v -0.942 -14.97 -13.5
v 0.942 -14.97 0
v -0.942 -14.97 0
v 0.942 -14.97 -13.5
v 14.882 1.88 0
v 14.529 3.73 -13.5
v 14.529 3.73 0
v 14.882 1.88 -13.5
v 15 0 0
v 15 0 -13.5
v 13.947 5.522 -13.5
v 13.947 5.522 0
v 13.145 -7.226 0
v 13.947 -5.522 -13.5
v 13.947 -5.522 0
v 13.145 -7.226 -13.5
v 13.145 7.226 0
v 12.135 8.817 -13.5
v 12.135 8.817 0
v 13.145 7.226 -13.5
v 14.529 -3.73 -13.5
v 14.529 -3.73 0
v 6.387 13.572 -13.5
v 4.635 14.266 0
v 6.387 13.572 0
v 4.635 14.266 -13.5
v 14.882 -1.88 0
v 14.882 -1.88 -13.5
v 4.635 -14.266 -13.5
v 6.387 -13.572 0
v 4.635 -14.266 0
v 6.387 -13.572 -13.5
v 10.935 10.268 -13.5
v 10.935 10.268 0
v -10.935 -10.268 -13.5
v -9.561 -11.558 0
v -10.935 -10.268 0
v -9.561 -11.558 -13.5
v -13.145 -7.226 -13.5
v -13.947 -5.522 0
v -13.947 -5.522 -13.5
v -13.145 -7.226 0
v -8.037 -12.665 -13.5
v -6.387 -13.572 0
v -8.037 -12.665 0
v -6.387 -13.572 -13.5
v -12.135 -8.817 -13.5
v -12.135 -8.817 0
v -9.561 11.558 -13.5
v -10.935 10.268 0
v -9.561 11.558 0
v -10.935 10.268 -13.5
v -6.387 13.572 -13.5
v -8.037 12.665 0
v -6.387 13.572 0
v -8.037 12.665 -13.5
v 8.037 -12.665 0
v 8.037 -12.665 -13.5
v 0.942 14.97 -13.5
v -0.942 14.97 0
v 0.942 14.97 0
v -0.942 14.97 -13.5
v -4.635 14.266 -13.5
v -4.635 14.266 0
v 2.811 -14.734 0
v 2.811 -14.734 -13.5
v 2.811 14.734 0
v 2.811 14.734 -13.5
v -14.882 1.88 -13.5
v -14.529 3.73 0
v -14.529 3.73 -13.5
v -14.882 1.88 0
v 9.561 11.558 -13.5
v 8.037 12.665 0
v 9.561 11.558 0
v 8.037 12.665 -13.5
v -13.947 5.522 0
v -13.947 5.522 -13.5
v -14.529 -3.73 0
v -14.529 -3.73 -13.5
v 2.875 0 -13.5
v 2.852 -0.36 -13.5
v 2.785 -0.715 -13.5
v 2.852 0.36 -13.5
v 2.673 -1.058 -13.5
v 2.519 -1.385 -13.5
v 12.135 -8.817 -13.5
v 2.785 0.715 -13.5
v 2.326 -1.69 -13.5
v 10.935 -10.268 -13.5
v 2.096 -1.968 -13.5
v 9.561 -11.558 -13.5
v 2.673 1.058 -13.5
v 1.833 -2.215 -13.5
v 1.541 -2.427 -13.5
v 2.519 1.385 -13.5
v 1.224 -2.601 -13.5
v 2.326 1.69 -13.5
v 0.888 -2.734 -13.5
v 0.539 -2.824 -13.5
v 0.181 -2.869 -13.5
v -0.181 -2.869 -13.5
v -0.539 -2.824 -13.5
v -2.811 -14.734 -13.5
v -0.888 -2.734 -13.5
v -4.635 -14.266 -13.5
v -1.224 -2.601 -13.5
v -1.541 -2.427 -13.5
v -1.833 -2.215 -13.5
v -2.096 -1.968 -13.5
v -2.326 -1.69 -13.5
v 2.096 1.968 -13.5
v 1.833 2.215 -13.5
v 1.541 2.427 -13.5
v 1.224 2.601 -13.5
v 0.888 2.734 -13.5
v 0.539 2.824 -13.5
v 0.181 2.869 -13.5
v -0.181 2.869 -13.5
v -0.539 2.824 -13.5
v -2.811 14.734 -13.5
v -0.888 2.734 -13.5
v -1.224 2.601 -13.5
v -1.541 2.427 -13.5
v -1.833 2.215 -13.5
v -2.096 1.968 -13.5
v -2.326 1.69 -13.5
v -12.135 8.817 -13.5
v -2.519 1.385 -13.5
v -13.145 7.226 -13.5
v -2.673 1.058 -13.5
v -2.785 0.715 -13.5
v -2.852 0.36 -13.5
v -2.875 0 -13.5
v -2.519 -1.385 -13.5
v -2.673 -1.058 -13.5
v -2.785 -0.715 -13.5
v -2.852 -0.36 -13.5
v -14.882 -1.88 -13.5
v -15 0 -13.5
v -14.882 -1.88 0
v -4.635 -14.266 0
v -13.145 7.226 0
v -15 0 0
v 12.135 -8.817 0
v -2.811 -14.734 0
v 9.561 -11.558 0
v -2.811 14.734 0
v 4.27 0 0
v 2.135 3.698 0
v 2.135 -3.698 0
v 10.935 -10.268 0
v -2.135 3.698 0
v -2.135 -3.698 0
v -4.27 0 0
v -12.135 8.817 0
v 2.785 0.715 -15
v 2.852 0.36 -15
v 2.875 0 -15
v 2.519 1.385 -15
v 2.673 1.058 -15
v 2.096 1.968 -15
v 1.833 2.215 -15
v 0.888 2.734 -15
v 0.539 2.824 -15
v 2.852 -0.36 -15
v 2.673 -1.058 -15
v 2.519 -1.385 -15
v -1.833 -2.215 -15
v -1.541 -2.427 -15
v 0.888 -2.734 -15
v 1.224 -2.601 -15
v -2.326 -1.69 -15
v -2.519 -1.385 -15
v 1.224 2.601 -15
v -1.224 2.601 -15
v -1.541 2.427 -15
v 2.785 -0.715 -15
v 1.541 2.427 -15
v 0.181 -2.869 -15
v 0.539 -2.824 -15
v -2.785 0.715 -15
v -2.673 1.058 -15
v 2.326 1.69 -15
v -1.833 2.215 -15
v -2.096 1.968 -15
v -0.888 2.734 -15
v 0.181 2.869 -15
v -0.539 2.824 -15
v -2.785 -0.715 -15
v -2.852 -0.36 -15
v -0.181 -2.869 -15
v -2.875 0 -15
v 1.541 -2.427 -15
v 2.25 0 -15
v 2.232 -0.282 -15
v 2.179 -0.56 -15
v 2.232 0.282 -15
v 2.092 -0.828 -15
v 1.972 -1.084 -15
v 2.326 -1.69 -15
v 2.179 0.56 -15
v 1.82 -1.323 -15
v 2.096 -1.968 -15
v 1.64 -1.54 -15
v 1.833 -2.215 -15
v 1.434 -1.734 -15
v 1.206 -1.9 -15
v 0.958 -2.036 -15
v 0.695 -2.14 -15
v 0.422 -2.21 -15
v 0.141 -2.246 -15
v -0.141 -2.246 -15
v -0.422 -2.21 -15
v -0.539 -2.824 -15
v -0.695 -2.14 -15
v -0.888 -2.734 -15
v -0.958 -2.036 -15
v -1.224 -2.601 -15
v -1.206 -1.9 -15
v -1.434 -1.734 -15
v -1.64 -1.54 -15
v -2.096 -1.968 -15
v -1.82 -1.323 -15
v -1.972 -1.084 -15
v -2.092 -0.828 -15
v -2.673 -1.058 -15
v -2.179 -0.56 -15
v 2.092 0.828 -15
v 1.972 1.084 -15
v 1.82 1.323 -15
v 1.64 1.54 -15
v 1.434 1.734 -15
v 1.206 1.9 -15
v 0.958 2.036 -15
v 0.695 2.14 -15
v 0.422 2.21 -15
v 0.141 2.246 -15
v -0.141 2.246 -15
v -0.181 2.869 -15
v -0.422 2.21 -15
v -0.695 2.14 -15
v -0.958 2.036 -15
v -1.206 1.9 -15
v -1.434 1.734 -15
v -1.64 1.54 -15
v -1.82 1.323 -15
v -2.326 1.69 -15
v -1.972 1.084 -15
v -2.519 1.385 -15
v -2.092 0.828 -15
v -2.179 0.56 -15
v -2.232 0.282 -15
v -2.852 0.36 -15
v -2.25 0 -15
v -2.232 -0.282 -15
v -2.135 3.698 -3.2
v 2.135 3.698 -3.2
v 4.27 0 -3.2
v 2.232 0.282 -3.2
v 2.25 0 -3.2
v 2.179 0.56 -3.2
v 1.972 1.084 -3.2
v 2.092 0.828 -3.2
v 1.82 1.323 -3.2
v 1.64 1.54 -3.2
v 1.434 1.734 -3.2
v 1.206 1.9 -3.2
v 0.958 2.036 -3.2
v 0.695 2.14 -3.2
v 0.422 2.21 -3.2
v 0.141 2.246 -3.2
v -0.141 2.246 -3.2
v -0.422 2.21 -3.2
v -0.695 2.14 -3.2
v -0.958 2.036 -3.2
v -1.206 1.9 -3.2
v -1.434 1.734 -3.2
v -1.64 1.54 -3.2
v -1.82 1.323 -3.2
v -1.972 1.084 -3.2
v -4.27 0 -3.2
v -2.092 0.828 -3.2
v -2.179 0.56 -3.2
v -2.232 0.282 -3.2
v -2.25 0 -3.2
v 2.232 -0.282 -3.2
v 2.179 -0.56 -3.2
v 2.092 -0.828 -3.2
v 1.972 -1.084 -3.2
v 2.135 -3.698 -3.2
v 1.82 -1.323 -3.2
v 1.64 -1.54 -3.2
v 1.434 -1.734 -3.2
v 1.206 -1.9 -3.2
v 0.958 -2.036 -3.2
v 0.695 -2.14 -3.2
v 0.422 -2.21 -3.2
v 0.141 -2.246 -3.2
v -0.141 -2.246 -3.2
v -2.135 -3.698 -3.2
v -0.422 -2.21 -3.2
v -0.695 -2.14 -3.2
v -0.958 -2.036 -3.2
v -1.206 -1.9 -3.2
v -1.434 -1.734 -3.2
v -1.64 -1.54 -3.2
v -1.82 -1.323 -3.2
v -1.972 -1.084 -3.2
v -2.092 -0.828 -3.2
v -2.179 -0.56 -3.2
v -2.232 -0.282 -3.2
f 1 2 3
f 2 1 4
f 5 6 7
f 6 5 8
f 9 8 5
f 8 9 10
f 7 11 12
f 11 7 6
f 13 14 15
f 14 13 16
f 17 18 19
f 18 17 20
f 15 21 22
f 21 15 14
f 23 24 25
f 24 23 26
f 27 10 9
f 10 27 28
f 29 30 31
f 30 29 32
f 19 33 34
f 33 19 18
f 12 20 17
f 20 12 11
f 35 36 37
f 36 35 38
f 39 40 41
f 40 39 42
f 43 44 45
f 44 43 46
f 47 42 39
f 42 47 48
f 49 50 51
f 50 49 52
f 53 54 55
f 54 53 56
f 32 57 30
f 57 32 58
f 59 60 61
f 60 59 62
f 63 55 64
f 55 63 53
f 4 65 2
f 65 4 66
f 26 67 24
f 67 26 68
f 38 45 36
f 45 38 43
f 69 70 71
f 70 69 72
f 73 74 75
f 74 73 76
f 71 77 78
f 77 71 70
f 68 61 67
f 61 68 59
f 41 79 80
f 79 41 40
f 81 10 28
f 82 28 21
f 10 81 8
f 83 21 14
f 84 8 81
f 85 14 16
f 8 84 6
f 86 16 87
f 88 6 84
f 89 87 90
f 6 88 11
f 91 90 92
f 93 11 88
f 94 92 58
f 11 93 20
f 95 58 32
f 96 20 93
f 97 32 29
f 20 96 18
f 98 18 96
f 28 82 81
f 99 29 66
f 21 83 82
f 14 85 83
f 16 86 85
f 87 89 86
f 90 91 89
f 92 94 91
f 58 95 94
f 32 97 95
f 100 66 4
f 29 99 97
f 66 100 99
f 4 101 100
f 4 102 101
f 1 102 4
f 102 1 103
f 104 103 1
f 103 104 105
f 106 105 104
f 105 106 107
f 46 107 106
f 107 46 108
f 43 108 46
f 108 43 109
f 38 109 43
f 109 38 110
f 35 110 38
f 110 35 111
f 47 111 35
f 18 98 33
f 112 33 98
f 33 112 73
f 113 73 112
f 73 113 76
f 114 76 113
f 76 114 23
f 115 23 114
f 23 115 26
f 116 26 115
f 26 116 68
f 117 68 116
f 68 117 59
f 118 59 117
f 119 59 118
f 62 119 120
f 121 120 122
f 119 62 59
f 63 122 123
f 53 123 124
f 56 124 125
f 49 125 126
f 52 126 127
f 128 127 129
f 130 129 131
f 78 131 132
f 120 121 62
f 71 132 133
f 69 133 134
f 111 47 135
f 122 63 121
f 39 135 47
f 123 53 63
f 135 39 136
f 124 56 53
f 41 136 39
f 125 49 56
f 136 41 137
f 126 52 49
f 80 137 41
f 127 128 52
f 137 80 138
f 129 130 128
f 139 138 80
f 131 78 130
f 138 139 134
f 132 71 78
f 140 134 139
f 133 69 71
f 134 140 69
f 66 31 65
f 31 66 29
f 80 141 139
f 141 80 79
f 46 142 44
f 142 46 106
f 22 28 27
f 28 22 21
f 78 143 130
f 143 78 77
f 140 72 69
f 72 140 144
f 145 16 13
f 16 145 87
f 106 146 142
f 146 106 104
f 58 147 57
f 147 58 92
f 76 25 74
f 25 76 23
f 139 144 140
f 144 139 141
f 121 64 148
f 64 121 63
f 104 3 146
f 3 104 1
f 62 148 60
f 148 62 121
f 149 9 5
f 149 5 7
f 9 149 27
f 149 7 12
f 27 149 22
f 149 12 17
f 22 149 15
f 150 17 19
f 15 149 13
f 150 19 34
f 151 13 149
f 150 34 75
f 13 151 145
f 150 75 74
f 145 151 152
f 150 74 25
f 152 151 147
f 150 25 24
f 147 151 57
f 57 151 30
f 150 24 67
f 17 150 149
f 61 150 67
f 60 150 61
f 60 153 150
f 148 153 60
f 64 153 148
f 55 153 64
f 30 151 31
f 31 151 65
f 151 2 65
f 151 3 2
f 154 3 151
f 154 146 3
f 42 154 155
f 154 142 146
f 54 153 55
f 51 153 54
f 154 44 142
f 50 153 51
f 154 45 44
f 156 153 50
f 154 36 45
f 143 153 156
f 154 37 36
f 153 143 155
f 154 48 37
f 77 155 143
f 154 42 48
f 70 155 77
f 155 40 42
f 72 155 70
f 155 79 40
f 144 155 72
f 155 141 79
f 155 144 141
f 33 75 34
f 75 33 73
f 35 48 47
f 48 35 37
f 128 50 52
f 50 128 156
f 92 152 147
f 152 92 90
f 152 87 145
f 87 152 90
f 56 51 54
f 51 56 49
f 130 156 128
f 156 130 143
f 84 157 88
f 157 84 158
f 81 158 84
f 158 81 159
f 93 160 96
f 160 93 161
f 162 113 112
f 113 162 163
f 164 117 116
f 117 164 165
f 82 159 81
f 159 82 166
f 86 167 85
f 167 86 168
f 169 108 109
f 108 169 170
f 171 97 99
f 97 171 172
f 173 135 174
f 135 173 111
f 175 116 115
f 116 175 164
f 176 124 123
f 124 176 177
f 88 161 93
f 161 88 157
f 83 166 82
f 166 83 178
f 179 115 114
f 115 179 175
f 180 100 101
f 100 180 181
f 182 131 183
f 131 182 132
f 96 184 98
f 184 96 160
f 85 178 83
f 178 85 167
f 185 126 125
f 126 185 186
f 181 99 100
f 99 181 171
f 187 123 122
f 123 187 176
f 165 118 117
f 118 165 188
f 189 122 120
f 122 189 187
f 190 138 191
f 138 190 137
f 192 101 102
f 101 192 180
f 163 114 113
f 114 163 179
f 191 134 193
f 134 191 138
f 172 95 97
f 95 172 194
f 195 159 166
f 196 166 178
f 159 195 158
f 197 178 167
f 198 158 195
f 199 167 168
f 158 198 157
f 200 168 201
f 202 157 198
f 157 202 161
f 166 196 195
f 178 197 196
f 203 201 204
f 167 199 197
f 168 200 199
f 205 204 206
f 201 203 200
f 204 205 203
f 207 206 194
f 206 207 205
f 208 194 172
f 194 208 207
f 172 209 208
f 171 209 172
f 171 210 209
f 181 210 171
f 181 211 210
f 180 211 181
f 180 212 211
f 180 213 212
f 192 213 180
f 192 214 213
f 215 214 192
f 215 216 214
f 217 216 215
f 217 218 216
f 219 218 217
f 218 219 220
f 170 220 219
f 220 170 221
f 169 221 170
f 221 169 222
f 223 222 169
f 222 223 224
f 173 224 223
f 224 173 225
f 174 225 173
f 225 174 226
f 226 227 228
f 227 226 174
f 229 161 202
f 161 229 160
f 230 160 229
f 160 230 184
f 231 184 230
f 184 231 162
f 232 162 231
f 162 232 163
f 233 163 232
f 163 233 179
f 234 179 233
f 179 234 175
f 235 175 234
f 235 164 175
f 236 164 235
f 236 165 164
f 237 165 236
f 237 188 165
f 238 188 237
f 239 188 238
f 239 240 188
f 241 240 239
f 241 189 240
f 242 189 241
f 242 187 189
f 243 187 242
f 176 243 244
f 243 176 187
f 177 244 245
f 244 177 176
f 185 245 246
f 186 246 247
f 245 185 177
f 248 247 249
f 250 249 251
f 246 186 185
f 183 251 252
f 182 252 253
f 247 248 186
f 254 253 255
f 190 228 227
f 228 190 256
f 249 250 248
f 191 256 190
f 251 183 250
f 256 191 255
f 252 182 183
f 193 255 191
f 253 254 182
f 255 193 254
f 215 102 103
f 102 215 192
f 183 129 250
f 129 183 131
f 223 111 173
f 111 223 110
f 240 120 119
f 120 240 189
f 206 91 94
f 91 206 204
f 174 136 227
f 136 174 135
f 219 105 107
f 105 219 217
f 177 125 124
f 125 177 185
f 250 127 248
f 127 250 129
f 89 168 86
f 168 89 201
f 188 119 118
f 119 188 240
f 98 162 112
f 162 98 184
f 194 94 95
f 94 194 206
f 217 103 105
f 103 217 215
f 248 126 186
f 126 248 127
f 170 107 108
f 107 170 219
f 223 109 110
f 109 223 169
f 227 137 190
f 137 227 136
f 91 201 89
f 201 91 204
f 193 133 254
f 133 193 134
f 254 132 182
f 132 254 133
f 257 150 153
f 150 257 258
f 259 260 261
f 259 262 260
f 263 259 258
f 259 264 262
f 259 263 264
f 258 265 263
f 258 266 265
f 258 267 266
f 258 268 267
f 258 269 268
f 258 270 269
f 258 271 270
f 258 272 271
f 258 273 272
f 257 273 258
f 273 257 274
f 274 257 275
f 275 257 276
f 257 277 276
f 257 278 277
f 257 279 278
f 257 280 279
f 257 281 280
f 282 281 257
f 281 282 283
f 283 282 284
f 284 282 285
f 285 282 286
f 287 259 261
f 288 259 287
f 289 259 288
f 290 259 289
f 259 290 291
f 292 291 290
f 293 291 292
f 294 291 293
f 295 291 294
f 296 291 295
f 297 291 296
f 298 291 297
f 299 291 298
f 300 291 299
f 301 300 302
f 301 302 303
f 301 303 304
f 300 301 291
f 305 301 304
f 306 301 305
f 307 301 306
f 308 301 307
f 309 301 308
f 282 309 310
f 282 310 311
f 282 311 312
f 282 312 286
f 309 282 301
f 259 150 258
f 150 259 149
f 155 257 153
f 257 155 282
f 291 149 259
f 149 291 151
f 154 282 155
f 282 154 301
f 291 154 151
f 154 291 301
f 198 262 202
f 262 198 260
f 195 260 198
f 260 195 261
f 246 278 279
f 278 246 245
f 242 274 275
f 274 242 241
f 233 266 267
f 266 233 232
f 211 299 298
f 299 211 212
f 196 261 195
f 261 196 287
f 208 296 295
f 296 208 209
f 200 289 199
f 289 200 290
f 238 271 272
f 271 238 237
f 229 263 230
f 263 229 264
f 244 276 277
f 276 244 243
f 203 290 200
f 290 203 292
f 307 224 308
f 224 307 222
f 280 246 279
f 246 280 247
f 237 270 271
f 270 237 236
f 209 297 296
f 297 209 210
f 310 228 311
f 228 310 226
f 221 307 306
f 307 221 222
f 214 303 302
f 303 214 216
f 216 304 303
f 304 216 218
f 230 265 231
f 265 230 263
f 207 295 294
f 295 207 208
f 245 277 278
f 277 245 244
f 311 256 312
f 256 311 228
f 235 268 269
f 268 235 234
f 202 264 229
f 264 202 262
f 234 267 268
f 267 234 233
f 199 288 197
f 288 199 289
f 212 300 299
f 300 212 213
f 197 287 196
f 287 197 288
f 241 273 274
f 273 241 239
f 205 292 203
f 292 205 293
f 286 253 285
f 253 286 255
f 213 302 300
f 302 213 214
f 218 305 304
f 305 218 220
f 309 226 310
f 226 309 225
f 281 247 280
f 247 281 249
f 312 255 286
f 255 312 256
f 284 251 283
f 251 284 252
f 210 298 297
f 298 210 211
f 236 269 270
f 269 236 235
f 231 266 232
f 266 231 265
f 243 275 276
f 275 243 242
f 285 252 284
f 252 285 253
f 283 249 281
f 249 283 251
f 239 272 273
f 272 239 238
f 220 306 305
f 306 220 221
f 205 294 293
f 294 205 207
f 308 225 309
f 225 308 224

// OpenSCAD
$fn = 50;

difference() {
	union() {
		translate(v = [0, 0, -13.5]) {
			cylinder(h = 13.5, r = 15.0);
		}
		#translate(v = [0, 0, -15.0]) {
			cylinder(h = 15, r = 2.875);
		}
	}
	union() {
		translate(v = [0, 0, 0]) {
			rotate(a = [0, 0, 0]) {
				difference() {
					union() {
						translate(v = [0, 0, -3.2]) {
							linear_extrude(height = 3.2) {
								polygon(points = [[4.2698, 0.0], [2.1349000000000005, 3.697755269078796], [-2.134899999999999, 3.6977552690787965], [-4.2698, 5.228996902999369e-16], [-2.134900000000002, -3.6977552690787956], [2.1348999999999974, -3.697755269078798]]);
							}
						}
					}
					union();
				}
			}
		}
		#translate(v = [0, 0, -100.0]) {
			cylinder(h = 200, r = 2.25);
		}
	}
}
